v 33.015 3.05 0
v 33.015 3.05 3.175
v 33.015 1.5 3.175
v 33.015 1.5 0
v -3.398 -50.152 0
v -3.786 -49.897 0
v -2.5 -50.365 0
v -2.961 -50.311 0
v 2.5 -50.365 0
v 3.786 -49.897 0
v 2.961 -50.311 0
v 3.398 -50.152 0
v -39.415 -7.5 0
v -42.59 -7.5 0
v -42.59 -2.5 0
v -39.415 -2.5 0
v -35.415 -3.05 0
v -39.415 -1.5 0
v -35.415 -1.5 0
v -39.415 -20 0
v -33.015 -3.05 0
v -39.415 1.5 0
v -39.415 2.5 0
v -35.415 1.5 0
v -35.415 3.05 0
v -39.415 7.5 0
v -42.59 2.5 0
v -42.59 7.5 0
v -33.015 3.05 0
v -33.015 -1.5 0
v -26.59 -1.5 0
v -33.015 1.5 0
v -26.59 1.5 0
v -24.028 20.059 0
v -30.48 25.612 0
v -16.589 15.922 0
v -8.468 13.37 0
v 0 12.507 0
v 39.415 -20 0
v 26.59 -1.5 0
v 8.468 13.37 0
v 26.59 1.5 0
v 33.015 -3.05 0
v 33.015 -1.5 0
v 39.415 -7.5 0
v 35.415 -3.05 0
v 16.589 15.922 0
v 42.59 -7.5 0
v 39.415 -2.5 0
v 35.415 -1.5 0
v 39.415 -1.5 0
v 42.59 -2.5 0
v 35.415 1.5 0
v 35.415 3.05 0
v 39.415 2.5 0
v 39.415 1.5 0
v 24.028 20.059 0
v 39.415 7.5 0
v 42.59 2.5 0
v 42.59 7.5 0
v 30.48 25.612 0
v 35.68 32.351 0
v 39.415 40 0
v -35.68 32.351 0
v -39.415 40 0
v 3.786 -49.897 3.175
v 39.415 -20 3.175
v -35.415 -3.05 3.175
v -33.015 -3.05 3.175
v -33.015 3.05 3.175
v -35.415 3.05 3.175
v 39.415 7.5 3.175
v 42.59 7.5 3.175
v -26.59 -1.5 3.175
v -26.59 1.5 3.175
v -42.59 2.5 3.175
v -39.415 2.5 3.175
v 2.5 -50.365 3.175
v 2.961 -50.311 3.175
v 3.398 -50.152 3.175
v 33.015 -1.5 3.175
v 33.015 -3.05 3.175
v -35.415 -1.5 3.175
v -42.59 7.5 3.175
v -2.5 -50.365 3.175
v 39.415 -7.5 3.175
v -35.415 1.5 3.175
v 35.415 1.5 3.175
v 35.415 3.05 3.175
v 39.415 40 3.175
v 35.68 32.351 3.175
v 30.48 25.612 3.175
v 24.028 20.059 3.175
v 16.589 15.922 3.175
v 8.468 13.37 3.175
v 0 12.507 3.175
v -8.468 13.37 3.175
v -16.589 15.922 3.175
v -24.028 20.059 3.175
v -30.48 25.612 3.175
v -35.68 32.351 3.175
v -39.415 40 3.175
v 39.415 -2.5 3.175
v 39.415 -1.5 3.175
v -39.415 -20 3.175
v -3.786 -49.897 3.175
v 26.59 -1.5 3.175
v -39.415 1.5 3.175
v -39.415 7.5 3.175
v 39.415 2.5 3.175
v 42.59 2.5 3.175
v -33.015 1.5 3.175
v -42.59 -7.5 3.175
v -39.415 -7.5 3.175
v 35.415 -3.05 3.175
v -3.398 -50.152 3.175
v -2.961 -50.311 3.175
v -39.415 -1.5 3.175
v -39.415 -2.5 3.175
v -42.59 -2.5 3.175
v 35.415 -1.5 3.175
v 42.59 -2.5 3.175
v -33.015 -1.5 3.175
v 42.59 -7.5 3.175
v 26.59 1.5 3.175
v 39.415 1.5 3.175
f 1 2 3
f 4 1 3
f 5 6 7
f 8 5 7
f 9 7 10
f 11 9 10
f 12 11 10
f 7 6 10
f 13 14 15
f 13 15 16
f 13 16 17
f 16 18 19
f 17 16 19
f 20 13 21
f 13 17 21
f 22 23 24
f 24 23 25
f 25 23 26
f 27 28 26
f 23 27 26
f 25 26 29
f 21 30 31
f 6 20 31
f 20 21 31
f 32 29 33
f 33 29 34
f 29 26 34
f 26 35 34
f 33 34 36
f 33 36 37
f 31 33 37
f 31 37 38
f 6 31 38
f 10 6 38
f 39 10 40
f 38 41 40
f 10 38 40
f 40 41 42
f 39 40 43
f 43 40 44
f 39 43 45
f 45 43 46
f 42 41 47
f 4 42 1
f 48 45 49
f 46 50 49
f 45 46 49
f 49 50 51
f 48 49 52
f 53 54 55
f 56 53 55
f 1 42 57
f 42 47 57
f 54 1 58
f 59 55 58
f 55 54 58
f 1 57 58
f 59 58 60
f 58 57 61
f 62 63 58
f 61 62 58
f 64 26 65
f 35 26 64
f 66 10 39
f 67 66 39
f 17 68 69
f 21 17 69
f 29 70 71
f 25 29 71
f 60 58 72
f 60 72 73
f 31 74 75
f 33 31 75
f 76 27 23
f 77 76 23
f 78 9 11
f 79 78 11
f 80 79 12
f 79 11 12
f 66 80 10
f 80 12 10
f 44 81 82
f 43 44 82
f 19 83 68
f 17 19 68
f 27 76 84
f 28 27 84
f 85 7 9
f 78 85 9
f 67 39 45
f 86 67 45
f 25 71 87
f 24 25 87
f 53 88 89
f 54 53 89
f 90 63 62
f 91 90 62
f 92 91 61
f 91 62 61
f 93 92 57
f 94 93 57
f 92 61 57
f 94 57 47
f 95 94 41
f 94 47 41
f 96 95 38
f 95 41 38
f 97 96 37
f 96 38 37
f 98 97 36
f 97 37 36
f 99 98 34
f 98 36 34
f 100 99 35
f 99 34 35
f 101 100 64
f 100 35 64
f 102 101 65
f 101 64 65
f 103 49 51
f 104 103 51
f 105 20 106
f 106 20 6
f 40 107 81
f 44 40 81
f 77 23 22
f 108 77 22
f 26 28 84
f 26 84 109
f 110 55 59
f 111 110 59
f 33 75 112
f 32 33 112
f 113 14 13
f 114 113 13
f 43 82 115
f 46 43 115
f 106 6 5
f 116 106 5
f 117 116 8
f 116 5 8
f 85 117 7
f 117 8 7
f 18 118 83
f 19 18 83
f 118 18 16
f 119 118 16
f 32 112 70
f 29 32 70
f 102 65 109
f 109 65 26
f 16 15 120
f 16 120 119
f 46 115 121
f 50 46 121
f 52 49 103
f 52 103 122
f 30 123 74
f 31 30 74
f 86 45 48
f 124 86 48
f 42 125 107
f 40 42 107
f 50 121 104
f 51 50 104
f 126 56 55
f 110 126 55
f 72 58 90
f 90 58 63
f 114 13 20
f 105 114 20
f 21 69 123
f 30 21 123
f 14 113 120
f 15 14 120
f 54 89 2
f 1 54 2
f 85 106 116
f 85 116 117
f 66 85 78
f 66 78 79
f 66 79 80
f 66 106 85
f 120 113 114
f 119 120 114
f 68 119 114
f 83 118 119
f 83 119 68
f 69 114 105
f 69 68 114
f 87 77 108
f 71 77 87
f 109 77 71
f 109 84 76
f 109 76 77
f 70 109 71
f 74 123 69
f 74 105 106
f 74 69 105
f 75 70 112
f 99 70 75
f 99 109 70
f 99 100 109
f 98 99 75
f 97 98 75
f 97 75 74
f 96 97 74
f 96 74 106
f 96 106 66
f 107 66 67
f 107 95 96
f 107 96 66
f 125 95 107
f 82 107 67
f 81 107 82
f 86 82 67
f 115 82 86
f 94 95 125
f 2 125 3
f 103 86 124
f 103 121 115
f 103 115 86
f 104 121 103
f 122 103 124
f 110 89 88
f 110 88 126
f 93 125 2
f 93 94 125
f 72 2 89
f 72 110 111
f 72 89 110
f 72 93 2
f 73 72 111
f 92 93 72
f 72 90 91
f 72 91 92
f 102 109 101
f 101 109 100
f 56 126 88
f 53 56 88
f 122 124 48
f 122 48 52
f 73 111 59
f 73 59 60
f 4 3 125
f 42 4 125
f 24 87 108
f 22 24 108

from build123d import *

# Parameters (mm, degrees)
BOSS_EXTRUDE1_DEPTH = 3.175
SKETCH2_W           = 3.175
SKETCH2_H           = 5
BOSS_EXTRUDE2_DEPTH = 3.175
CUT_EXTRUDE1_DEPTH  = 67.034660983


with BuildPart() as part:
    # Sketch1 → Boss-Extrude1 (new body)
    with BuildSketch(Plane.XY):
        with BuildLine():
            Line((39.415, -20), (39.415, 40))
            ThreePointArc((39.415, 40), (0, 12.507162886), (-39.415, 40))
            Line((-39.415, 40), (-39.415, -20))
            Line((-39.415, -20), (-3.785575219, -49.896637192))
            ThreePointArc((-3.785575219, -49.896637192), (-3.184040287, -50.243933548), (-2.5, -50.364548306))
            Line((-2.5, -50.364548306), (2.5, -50.364548306))
            ThreePointArc((2.5, -50.364548306), (3.184040287, -50.243933548), (3.785575219, -49.896637192))
            Line((3.785575219, -49.896637192), (39.415, -20))
        make_face()
    extrude(amount=BOSS_EXTRUDE1_DEPTH)

    # Sketch2 → Boss-Extrude2 (add)
    with BuildSketch(Plane.XY.offset(3.175)):
        with Locations((41.0025, -5)):
            Rectangle(SKETCH2_W, SKETCH2_H)
        with Locations((41.0025, 5)):
            Rectangle(SKETCH2_W, SKETCH2_H)
        with Locations((-41.0025, 5)):
            Rectangle(SKETCH2_W, SKETCH2_H)
        with Locations((-41.0025, -5)):
            Rectangle(SKETCH2_W, SKETCH2_H)
    extrude(amount=-BOSS_EXTRUDE2_DEPTH)

    # Sketch3 → Cut-Extrude1 (cut, through all)
    with BuildSketch(Plane.XY.offset(3.175)):
        Polygon((39.415, 1.5), (35.415, 1.5), (35.415, 3.05), (33.015, 3.05), (33.015, 1.5), (26.59, 1.5), (26.59, -1.5), (33.015, -1.5), (33.015, -3.05), (35.415, -3.05), (35.415, -1.5), (39.415, -1.5), align=None)
        Polygon((-39.415, -1.5), (-35.415, -1.5), (-35.415, -3.05), (-33.015, -3.05), (-33.015, -1.5), (-26.59, -1.5), (-26.59, 1.5), (-33.015, 1.5), (-33.015, 3.05), (-35.415, 3.05), (-35.415, 1.5), (-39.415, 1.5), align=None)
    extrude(amount=-CUT_EXTRUDE1_DEPTH, mode=Mode.SUBTRACT)


solid = part.part
